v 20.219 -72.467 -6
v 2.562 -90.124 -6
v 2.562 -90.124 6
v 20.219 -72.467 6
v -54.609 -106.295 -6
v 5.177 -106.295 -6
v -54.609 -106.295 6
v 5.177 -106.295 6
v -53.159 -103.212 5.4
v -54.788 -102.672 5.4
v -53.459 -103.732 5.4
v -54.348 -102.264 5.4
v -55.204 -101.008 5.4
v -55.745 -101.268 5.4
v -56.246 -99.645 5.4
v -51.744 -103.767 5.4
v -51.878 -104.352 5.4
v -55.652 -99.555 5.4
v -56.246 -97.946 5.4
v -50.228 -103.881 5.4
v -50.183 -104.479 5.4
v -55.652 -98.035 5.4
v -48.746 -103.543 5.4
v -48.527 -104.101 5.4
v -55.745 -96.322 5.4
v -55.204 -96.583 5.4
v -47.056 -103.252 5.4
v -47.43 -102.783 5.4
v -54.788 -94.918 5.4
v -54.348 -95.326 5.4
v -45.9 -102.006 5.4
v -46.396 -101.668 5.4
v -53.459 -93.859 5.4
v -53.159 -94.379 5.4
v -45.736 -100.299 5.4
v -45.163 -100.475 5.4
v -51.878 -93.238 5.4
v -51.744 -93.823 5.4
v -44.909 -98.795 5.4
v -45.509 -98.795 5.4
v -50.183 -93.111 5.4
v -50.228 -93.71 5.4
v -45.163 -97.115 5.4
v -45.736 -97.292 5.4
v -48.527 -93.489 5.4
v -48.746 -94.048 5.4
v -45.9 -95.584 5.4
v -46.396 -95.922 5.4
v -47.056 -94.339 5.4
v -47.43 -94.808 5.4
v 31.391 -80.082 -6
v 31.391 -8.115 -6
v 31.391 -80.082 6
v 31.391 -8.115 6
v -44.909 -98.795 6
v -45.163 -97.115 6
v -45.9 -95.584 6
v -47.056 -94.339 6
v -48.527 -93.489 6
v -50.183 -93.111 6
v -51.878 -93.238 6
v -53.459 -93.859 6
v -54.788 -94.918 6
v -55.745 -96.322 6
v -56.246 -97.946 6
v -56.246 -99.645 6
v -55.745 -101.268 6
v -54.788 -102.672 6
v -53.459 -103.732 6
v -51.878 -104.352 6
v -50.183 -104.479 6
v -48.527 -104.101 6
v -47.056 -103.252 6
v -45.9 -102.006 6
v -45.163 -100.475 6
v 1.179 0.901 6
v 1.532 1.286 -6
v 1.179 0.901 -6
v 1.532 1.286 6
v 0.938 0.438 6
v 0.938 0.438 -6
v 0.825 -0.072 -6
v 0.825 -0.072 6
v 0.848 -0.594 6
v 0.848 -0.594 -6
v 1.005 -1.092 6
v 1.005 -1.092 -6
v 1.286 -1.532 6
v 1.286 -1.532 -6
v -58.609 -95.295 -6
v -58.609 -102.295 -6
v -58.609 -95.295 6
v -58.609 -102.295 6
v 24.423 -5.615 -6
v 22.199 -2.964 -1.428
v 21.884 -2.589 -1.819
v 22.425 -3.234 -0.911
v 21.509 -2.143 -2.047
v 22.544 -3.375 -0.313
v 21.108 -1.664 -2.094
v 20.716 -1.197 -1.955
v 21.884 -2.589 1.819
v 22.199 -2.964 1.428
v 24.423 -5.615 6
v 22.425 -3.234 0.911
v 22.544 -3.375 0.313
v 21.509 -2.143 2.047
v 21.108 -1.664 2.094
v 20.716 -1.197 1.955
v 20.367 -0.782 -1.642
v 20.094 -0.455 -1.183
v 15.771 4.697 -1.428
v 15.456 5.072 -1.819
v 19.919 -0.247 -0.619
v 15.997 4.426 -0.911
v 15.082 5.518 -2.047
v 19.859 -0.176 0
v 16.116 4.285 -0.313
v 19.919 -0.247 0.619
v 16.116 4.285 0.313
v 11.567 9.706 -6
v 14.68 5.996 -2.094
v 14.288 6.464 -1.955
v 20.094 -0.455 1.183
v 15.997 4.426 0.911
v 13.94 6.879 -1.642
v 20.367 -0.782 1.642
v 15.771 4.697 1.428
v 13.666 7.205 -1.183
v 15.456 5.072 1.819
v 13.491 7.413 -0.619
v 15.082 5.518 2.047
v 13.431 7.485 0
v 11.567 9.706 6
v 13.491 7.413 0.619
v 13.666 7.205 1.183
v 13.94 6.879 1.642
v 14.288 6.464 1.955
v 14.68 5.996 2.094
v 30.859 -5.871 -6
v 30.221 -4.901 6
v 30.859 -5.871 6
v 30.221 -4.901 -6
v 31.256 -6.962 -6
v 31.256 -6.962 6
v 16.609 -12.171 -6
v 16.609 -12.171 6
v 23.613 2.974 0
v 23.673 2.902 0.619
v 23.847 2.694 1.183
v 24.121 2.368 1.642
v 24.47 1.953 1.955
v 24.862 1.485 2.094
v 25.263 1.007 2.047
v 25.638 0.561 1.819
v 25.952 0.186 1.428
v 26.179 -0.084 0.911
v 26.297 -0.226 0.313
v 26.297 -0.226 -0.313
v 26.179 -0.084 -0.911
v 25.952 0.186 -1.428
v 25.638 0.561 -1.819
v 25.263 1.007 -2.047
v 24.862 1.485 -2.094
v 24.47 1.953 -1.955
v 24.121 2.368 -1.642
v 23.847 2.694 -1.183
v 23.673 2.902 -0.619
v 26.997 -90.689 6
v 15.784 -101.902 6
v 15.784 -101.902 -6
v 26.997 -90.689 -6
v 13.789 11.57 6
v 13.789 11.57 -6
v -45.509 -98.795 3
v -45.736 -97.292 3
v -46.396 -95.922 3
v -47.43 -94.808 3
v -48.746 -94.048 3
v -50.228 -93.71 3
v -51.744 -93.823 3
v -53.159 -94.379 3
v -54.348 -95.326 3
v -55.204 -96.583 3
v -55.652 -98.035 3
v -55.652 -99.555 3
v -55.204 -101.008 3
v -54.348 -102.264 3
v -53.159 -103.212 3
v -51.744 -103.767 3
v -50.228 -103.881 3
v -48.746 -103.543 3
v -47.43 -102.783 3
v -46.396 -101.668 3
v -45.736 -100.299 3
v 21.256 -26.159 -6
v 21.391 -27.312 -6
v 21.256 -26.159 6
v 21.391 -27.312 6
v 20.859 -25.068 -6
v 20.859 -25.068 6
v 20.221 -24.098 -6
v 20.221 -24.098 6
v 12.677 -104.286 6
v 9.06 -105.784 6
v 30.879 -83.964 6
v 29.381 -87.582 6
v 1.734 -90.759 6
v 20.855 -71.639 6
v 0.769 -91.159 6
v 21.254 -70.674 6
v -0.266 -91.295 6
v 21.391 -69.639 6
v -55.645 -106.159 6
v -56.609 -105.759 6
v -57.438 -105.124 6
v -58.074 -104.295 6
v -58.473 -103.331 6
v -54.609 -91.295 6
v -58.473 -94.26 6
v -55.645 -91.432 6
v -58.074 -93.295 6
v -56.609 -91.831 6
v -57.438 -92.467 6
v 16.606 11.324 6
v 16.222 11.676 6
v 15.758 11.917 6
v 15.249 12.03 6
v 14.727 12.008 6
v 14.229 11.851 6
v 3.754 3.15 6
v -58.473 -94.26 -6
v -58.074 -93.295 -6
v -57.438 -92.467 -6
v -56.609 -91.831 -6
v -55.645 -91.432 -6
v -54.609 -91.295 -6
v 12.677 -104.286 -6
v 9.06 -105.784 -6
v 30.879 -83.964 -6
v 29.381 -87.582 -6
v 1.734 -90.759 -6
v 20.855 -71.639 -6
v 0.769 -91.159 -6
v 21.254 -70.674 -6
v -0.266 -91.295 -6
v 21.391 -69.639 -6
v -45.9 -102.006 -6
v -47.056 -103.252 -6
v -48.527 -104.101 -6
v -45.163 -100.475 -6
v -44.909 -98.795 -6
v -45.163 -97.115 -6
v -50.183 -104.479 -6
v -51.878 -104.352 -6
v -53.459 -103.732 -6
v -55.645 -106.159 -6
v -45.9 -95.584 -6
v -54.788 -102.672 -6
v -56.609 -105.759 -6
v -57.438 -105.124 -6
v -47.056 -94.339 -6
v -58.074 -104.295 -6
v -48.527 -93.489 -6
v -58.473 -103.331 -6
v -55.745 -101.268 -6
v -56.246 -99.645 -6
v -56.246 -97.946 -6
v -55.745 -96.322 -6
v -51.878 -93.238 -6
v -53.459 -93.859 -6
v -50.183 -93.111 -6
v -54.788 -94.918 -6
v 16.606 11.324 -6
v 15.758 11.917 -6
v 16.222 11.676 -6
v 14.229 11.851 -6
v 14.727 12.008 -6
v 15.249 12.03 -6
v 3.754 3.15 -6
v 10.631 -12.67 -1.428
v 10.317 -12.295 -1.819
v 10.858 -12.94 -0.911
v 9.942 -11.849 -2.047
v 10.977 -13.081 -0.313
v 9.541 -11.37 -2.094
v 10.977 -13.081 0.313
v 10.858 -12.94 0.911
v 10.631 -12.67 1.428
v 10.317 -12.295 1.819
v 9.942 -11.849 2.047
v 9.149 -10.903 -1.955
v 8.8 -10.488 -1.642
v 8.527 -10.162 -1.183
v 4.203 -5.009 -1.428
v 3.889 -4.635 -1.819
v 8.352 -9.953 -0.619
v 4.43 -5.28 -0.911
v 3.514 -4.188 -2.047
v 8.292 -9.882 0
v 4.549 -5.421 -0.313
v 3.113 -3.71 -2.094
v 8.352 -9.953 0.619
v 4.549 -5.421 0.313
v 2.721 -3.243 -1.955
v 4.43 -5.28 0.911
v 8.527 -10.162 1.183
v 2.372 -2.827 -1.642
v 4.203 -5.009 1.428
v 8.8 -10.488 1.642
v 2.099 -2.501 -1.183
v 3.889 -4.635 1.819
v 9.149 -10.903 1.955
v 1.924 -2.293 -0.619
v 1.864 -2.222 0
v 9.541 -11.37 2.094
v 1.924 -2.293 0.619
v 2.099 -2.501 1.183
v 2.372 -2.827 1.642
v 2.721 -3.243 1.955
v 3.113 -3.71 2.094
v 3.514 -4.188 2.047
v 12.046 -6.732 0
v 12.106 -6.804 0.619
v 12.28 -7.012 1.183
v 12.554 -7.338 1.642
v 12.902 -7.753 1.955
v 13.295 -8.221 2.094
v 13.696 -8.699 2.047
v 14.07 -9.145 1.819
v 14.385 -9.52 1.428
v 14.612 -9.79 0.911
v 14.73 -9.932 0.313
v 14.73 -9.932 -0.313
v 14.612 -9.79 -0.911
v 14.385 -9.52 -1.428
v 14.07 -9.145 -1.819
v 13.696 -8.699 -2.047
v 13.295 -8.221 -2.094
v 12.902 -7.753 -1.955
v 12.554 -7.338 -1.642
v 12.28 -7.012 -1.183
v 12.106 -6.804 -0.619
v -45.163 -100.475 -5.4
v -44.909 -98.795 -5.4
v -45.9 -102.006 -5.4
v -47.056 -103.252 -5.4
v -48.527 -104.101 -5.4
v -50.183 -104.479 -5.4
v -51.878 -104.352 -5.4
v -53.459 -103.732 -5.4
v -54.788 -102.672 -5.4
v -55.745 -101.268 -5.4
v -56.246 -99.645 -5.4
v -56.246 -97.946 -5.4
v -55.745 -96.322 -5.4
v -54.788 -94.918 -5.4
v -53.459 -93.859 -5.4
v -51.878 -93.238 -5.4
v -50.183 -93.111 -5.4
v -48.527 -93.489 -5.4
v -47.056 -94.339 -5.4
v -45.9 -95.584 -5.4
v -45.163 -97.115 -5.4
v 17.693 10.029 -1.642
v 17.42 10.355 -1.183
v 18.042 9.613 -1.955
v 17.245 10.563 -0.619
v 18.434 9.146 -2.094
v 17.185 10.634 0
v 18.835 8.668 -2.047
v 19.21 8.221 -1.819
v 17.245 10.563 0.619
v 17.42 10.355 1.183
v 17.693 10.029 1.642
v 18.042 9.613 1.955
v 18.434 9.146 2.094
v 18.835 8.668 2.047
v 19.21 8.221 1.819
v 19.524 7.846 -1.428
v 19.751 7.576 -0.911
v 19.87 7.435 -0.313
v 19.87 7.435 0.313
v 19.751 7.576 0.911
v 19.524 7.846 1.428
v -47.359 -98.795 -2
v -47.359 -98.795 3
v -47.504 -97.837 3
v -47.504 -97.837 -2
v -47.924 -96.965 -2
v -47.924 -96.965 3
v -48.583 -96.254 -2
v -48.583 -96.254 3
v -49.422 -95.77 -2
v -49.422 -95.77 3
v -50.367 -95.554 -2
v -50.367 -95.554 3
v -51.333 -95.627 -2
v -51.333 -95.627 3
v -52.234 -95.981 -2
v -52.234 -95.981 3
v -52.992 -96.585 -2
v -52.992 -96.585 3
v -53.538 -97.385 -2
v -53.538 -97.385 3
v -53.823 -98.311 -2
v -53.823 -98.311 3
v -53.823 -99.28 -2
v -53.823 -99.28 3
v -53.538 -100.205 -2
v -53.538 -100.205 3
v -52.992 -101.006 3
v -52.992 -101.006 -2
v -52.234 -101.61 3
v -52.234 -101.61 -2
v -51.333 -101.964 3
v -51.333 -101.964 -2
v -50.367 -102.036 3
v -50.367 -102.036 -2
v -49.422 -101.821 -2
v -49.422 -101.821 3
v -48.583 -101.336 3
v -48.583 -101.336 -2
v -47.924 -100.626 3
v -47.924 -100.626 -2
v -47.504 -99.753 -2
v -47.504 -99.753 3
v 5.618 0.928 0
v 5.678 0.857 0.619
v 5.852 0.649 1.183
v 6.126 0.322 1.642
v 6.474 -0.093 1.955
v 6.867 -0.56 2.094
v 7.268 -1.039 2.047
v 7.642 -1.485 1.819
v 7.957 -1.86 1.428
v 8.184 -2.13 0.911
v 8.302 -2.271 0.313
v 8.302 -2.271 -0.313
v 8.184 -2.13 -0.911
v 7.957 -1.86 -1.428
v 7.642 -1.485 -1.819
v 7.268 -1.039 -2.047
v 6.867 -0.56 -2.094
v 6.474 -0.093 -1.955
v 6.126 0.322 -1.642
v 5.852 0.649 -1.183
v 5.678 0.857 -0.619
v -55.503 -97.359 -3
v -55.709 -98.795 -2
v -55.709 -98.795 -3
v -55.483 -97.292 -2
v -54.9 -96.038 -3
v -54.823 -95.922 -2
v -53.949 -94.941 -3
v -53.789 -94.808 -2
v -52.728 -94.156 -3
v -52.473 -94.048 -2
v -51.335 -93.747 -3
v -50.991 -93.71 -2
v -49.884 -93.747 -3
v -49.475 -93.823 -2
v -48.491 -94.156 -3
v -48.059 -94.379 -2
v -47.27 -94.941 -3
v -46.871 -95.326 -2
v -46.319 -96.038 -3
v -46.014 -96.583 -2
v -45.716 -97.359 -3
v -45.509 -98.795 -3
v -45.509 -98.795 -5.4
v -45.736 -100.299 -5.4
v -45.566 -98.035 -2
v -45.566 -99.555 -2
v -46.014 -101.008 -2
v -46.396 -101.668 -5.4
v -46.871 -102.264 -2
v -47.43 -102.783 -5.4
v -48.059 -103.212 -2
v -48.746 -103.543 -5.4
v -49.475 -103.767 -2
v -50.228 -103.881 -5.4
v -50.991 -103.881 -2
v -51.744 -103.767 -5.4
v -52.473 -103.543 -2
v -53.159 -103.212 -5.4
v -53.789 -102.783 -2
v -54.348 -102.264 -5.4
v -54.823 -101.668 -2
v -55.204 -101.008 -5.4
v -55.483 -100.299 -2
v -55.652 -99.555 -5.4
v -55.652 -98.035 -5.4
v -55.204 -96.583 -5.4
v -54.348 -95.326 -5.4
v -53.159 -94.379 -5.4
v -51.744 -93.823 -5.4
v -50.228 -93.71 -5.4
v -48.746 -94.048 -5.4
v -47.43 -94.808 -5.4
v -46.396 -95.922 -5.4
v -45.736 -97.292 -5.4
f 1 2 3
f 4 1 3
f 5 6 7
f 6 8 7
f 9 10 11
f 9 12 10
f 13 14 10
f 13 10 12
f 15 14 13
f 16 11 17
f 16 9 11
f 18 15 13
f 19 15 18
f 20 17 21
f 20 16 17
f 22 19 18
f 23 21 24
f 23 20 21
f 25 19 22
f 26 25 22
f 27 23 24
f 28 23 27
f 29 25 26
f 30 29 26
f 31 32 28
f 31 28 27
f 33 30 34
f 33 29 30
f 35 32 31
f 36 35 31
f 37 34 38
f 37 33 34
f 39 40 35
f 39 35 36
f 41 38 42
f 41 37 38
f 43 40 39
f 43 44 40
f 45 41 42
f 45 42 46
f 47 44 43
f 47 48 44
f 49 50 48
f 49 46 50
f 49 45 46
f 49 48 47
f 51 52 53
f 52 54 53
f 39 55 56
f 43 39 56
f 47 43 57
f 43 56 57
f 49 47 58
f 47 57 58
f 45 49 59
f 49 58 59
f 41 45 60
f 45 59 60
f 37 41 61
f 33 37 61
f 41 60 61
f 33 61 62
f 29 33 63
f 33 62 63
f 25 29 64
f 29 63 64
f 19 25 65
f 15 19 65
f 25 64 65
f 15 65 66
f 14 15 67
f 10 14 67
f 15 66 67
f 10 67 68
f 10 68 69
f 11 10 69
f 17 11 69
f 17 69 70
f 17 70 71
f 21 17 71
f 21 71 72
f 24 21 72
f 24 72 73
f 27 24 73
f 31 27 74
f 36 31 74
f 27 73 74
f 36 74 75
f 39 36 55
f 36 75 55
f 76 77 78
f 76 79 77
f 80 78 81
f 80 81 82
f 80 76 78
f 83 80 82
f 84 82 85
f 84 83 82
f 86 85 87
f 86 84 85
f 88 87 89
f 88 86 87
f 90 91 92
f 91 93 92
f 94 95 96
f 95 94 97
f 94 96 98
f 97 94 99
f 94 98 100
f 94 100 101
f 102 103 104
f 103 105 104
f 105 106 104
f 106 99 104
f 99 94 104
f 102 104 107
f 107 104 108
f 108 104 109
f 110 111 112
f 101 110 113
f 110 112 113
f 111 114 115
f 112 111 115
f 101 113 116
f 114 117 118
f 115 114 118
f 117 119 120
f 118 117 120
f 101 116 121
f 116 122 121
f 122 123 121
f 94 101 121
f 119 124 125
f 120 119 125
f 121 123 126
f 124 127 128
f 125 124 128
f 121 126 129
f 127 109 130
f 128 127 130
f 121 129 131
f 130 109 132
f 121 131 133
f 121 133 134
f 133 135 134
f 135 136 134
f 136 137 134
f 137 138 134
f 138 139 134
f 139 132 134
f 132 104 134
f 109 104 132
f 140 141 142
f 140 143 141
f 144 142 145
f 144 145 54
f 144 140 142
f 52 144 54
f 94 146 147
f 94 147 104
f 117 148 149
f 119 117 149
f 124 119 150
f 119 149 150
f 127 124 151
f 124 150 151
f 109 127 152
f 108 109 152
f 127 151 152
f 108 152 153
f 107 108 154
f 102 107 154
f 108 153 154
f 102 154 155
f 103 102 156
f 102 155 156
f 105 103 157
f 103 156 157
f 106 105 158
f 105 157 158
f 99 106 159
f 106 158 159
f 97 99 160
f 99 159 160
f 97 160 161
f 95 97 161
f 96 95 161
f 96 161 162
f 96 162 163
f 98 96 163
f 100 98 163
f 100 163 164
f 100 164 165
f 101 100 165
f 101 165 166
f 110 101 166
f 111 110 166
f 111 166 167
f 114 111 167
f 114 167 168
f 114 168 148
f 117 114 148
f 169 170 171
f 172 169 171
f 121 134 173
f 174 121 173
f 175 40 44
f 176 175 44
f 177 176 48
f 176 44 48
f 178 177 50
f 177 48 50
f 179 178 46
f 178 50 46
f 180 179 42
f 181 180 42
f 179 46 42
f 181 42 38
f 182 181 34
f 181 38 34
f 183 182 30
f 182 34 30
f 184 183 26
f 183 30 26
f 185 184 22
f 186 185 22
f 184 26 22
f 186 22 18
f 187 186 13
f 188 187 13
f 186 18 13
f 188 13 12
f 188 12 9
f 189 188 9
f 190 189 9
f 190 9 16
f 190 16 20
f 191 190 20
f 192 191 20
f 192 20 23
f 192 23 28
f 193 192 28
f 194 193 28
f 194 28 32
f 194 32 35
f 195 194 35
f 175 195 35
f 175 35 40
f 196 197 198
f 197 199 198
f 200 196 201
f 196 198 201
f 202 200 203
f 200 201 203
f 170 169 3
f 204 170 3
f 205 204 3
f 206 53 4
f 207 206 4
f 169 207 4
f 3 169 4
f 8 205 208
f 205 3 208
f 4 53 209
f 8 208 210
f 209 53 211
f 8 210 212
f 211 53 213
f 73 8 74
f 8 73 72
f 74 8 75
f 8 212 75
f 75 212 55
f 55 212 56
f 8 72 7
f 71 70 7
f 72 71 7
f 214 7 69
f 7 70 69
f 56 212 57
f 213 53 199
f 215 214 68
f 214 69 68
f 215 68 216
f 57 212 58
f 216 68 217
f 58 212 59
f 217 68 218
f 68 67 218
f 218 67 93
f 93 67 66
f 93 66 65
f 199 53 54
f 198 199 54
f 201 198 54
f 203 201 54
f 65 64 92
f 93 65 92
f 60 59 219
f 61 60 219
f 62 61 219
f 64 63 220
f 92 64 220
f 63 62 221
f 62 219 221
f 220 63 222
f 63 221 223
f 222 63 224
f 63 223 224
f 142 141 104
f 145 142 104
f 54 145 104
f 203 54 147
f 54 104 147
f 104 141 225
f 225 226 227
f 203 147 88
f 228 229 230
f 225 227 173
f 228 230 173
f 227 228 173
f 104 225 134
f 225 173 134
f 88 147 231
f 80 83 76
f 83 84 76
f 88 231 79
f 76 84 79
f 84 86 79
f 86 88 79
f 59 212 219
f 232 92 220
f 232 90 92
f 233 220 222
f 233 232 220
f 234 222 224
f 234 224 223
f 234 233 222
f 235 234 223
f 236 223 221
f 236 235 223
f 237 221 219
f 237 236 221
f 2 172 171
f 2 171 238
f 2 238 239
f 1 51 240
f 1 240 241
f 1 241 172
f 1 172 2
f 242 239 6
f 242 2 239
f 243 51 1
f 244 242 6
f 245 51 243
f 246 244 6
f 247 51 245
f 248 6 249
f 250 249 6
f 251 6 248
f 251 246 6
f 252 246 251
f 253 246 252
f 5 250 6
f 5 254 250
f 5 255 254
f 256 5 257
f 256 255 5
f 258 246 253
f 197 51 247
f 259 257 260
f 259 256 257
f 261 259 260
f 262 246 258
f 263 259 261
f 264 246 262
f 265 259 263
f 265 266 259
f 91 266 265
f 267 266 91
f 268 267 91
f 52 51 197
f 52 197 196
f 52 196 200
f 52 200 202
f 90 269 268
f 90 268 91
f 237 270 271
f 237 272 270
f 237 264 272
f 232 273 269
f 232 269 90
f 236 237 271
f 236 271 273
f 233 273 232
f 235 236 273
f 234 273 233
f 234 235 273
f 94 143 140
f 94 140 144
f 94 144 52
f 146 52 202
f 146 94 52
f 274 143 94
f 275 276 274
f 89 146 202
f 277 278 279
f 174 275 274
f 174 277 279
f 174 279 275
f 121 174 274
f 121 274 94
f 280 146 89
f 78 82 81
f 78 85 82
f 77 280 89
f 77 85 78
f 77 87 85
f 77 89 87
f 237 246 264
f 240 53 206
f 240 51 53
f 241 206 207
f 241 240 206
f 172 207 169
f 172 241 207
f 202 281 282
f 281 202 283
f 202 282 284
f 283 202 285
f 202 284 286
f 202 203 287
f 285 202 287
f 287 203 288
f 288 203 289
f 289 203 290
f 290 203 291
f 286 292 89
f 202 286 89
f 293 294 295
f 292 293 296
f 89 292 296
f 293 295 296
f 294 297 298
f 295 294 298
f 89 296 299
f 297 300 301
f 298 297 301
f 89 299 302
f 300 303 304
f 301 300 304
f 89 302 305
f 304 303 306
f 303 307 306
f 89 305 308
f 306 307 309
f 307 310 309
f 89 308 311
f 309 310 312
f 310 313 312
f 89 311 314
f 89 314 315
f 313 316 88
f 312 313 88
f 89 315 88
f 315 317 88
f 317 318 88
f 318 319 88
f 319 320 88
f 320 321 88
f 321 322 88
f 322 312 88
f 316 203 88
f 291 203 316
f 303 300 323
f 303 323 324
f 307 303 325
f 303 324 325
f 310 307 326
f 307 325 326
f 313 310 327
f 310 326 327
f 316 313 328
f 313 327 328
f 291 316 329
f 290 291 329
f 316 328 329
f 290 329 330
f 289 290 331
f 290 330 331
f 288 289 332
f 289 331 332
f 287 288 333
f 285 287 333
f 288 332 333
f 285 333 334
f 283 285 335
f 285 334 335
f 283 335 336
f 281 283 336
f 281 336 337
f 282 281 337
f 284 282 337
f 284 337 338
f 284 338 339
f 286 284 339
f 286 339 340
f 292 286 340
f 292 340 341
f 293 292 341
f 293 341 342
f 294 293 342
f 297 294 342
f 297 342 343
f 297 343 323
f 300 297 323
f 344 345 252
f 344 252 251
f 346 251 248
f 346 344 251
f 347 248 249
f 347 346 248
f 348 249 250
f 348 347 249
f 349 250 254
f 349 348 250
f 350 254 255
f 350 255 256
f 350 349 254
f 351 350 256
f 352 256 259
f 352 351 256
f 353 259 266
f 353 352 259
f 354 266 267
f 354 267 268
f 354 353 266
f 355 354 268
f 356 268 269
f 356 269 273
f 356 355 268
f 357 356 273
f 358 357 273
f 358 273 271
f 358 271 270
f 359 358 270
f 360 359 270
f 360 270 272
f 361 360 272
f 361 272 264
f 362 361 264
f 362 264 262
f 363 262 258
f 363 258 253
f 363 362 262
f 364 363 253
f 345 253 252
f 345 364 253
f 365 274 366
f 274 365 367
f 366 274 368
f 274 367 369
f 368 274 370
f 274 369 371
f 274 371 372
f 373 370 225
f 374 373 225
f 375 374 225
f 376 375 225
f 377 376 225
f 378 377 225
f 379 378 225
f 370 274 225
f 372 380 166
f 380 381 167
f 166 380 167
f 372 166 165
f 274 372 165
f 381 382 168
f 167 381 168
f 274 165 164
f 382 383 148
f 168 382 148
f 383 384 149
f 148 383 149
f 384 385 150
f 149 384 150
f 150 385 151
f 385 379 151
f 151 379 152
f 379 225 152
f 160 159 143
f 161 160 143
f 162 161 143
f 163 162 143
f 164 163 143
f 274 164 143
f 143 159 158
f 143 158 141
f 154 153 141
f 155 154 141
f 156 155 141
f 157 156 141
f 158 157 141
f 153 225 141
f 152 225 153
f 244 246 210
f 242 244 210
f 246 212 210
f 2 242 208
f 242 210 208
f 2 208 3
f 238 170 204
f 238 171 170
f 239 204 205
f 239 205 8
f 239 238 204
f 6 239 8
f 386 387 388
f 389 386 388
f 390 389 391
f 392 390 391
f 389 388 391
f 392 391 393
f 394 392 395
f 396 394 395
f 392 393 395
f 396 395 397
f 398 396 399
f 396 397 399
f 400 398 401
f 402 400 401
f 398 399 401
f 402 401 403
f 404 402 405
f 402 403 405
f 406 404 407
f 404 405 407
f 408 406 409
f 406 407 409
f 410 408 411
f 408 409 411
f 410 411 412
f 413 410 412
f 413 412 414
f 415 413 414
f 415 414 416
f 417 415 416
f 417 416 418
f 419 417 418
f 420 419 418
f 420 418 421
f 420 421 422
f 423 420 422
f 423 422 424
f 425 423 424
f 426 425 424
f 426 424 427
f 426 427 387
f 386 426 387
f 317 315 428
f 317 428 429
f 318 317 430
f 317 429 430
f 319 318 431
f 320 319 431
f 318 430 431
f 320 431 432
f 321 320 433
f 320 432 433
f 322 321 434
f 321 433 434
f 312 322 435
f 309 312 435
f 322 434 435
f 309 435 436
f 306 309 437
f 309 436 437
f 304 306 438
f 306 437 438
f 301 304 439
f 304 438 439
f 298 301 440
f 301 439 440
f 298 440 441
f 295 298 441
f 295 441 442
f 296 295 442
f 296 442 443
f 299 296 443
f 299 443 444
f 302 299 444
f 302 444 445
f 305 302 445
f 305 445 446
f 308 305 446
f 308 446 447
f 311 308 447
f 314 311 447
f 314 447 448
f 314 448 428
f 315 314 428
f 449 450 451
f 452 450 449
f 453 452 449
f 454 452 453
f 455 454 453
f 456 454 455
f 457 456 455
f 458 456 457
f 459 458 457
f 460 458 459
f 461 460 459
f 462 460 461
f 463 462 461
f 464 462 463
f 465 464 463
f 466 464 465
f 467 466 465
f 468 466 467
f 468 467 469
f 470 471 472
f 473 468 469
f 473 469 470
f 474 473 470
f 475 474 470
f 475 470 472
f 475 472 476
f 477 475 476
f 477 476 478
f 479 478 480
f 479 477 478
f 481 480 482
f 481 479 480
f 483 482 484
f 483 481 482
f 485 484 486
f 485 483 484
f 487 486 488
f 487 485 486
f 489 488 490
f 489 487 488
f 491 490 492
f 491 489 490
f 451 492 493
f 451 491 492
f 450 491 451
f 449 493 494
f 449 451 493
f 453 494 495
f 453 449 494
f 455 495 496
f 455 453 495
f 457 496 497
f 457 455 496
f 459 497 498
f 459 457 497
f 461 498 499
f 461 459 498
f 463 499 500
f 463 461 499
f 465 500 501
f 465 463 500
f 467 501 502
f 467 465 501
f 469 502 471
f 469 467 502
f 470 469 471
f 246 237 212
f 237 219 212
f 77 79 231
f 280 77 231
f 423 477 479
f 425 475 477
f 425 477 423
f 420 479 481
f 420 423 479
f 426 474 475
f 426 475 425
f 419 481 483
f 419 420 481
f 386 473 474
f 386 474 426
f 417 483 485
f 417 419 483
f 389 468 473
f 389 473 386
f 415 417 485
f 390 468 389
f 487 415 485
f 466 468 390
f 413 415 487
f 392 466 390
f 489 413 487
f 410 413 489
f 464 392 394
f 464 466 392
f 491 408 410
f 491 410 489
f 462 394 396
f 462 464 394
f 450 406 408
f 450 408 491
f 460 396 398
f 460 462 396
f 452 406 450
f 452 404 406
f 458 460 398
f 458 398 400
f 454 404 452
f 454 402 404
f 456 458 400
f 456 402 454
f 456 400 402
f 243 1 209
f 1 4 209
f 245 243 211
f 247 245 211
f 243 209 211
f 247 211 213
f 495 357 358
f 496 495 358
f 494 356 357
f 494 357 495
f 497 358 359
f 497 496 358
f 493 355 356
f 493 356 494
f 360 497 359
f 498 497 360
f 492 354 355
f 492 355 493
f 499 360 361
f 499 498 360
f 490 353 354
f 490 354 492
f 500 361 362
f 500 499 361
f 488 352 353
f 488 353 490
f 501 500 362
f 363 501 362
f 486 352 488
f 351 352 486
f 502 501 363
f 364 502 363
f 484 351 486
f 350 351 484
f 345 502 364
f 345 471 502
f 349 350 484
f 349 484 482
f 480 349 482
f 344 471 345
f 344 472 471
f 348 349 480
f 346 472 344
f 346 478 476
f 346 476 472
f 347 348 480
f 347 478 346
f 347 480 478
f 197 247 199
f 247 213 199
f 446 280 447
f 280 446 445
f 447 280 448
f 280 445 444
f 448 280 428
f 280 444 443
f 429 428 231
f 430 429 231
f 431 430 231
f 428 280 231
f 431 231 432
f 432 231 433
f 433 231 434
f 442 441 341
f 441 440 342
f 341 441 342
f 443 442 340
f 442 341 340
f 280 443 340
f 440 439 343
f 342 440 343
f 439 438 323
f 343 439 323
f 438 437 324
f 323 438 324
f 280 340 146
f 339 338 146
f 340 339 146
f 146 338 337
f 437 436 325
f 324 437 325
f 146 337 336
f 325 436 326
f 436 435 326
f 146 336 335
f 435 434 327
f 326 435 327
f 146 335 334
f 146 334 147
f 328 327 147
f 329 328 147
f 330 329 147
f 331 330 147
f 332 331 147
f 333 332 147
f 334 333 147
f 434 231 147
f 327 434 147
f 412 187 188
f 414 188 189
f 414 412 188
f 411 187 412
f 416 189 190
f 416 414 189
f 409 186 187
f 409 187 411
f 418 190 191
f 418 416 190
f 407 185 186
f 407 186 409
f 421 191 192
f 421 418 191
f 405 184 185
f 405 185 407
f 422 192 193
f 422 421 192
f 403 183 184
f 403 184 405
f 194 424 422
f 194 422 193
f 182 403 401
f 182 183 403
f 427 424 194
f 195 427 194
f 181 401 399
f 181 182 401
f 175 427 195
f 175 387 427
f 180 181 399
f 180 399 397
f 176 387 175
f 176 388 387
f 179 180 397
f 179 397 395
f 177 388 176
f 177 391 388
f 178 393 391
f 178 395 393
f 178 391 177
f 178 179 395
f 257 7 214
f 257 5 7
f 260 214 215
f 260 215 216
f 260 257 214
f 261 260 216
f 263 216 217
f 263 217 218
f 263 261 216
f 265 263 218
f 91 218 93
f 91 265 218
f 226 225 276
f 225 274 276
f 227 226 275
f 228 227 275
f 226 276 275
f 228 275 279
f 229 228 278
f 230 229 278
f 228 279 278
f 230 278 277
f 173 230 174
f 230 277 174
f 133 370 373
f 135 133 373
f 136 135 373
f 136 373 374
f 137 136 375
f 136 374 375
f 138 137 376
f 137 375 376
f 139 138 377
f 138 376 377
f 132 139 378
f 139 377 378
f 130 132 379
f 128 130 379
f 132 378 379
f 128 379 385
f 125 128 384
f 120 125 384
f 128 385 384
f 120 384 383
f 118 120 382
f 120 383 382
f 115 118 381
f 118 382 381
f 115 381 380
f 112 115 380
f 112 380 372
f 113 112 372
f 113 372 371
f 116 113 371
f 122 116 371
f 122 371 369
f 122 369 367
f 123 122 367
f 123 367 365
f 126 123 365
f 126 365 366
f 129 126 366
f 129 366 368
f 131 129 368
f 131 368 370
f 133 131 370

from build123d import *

# Parameters (mm, degrees)
EXTRUDE_1_DEPTH     = 6
CUT_EXTRUDE_1_DEPTH = 122.974454449
SKETCH_3_R          = 3.25
CUT_EXTRUDE_2_DEPTH = 122.974454449
SKETCH_4_R          = 2.1
CUT_EXTRUDE_3_DEPTH = 141.351978867
CHAMFER_1_SIZE      = 20
CHAMFER_2_SIZE      = 20
FILLET_1_R          = 4
FILLET_2_R          = 2
FILLET_3_R          = 15
SKETCH_5_R          = 5.1
CUT_EXTRUDE_4_DEPTH = 3
SKETCH_7_R          = 5.7
CUT_EXTRUDE_6_DEPTH = 0.6
CUT_EXTRUDE_START   = -3
SKETCH_8_R          = 5.1
CUT_EXTRUDE_7_DEPTH = 3
CUT_EXTRUDE_START_2 = -0.6
SKETCH_9_R          = 5.7
CUT_EXTRUDE_8_DEPTH = 0.6
CUT_EXTRUDE_START_3 = -4
SKETCH_6_R          = 5.1
CUT_EXTRUDE_5_DEPTH = 4
FILLET_4_R          = 5


with BuildPart() as part:
    # 草图1 → 凸台-拉伸1 (new, symmetric)
    with BuildSketch(Plane.XY):
        Polygon((0, 0), (15.320888862, 12.855752194), (31.390579105, -6.295358884), (31.390579105, -106.295358884), (-58.609420895, -106.295358884), (-58.609420895, -91.295358884), (21.390579105, -91.295358884), (21.390579105, -25.492299496), align=None)
    extrude(amount=EXTRUDE_1_DEPTH, both=True)

    # 草图2 → 切除-拉伸1 (cut, through all)
    with BuildSketch(Plane.XY.offset(6)):
        Polygon((3.753617771, 3.149659287), (16.609369965, -12.171229575), (24.423023285, -5.614795956), (11.567271091, 9.706092906), align=None)
    extrude(amount=-CUT_EXTRUDE_1_DEPTH, mode=Mode.SUBTRACT)

    # 草图3 → 切除-拉伸2 (cut, through all)
    with BuildSketch(Plane.XY.offset(6)):
        with Locations((-50.609420895, -98.795358884)):
            Circle(SKETCH_3_R)
    extrude(amount=-CUT_EXTRUDE_2_DEPTH, mode=Mode.SUBTRACT)

    # 草图4 → 切除-拉伸3 (cut, through all)
    with BuildSketch(Plane(origin=(15.320888862, 12.855752194, 0), x_dir=(0, 0, -1), z_dir=(0.766044443118977, 0.6427876096865407, 0))):
        with Locations(Location((0, -5, 0), (0, 0, 90))):
            Circle(SKETCH_4_R)
        with Locations(Location((0, -15, 0), (0, 0, 90))):
            Circle(SKETCH_4_R)
    extrude(amount=-CUT_EXTRUDE_3_DEPTH, mode=Mode.SUBTRACT)

    # 倒角1
    chamfer_1_edges = [part.edges().sort_by_distance(p)[0] for p in [
        (21.390579105, -91.295358884, 0),
    ]]
    chamfer(chamfer_1_edges, length=CHAMFER_1_SIZE)

    # 倒角2
    chamfer_2_edges = [part.edges().sort_by_distance(p)[0] for p in [
        (31.390579105, -106.295358884, 0),
    ]]
    chamfer(chamfer_2_edges, length=CHAMFER_2_SIZE)

    # 圆角1
    fillet_1_edges = [part.edges().sort_by_distance(p)[0] for p in [
        (-58.609420895, -106.295358884, 0),
        (-58.609420895, -91.295358884, 0),
        (1.390579105, -91.295358884, 0),
        (21.390579105, -71.295358884, 0),
    ]]
    fillet(fillet_1_edges, radius=FILLET_1_R)

    # 圆角2
    fillet_2_edges = [part.edges().sort_by_distance(p)[0] for p in [
        (0, 0, 0),
        (15.320888862, 12.855752194, 0),
    ]]
    fillet(fillet_2_edges, radius=FILLET_2_R)

    # 圆角3
    fillet_3_edges = [part.edges().sort_by_distance(p)[0] for p in [
        (31.390579105, -86.295358884, 0),
        (11.390579105, -106.295358884, 0),
    ]]
    fillet(fillet_3_edges, radius=FILLET_3_R)

    # 草图5 → 切除-拉伸4 (cut)
    with BuildSketch(Plane.XY.offset(6)):
        with Locations((-50.609420895, -98.795358884)):
            Circle(SKETCH_5_R)
    extrude(amount=-CUT_EXTRUDE_4_DEPTH, mode=Mode.SUBTRACT)

    # 草图7 → 切除-拉伸6 (cut)
    with BuildSketch(Plane.XY.offset(6)):
        with Locations((-50.609420895, -98.795358884)):
            Circle(SKETCH_7_R)
    extrude(amount=-CUT_EXTRUDE_6_DEPTH, mode=Mode.SUBTRACT)

    # 草图8 → 切除-拉伸7 (cut)
    with BuildSketch(Plane(origin=(0, 0, -6), x_dir=(-1, 0, 0), z_dir=(0, 0, -1)).offset(CUT_EXTRUDE_START)):
        with Locations(Location((50.609420895, -98.795358884, 0), (0, 0, 180))):
            Circle(SKETCH_8_R)
    extrude(amount=CUT_EXTRUDE_7_DEPTH, mode=Mode.SUBTRACT)

    # 草图9 → 切除-拉伸8 (cut)
    with BuildSketch(Plane(origin=(0, 0, -6), x_dir=(-1, 0, 0), z_dir=(0, 0, -1)).offset(CUT_EXTRUDE_START_2)):
        with Locations(Location((50.609420895, -98.795358884, 0), (0, 0, 180))):
            Circle(SKETCH_9_R)
    extrude(amount=CUT_EXTRUDE_8_DEPTH, mode=Mode.SUBTRACT)

    # 草图6 → 切除-拉伸5 (cut)
    with BuildSketch(Plane(origin=(0, 0, -6), x_dir=(-1, 0, 0), z_dir=(0, 0, -1)).offset(CUT_EXTRUDE_START_3)):
        with Locations((50.609420895, -98.795358884)):
            Circle(SKETCH_6_R)
    extrude(amount=CUT_EXTRUDE_5_DEPTH, mode=Mode.SUBTRACT)

    # 圆角4
    fillet_4_edges = [part.edges().sort_by_distance(p)[0] for p in [
        (31.390579105, -6.295358884, 0),
        (21.390579105, -25.492299496, 0),
    ]]
    fillet(fillet_4_edges, radius=FILLET_4_R)


solid = part.part
